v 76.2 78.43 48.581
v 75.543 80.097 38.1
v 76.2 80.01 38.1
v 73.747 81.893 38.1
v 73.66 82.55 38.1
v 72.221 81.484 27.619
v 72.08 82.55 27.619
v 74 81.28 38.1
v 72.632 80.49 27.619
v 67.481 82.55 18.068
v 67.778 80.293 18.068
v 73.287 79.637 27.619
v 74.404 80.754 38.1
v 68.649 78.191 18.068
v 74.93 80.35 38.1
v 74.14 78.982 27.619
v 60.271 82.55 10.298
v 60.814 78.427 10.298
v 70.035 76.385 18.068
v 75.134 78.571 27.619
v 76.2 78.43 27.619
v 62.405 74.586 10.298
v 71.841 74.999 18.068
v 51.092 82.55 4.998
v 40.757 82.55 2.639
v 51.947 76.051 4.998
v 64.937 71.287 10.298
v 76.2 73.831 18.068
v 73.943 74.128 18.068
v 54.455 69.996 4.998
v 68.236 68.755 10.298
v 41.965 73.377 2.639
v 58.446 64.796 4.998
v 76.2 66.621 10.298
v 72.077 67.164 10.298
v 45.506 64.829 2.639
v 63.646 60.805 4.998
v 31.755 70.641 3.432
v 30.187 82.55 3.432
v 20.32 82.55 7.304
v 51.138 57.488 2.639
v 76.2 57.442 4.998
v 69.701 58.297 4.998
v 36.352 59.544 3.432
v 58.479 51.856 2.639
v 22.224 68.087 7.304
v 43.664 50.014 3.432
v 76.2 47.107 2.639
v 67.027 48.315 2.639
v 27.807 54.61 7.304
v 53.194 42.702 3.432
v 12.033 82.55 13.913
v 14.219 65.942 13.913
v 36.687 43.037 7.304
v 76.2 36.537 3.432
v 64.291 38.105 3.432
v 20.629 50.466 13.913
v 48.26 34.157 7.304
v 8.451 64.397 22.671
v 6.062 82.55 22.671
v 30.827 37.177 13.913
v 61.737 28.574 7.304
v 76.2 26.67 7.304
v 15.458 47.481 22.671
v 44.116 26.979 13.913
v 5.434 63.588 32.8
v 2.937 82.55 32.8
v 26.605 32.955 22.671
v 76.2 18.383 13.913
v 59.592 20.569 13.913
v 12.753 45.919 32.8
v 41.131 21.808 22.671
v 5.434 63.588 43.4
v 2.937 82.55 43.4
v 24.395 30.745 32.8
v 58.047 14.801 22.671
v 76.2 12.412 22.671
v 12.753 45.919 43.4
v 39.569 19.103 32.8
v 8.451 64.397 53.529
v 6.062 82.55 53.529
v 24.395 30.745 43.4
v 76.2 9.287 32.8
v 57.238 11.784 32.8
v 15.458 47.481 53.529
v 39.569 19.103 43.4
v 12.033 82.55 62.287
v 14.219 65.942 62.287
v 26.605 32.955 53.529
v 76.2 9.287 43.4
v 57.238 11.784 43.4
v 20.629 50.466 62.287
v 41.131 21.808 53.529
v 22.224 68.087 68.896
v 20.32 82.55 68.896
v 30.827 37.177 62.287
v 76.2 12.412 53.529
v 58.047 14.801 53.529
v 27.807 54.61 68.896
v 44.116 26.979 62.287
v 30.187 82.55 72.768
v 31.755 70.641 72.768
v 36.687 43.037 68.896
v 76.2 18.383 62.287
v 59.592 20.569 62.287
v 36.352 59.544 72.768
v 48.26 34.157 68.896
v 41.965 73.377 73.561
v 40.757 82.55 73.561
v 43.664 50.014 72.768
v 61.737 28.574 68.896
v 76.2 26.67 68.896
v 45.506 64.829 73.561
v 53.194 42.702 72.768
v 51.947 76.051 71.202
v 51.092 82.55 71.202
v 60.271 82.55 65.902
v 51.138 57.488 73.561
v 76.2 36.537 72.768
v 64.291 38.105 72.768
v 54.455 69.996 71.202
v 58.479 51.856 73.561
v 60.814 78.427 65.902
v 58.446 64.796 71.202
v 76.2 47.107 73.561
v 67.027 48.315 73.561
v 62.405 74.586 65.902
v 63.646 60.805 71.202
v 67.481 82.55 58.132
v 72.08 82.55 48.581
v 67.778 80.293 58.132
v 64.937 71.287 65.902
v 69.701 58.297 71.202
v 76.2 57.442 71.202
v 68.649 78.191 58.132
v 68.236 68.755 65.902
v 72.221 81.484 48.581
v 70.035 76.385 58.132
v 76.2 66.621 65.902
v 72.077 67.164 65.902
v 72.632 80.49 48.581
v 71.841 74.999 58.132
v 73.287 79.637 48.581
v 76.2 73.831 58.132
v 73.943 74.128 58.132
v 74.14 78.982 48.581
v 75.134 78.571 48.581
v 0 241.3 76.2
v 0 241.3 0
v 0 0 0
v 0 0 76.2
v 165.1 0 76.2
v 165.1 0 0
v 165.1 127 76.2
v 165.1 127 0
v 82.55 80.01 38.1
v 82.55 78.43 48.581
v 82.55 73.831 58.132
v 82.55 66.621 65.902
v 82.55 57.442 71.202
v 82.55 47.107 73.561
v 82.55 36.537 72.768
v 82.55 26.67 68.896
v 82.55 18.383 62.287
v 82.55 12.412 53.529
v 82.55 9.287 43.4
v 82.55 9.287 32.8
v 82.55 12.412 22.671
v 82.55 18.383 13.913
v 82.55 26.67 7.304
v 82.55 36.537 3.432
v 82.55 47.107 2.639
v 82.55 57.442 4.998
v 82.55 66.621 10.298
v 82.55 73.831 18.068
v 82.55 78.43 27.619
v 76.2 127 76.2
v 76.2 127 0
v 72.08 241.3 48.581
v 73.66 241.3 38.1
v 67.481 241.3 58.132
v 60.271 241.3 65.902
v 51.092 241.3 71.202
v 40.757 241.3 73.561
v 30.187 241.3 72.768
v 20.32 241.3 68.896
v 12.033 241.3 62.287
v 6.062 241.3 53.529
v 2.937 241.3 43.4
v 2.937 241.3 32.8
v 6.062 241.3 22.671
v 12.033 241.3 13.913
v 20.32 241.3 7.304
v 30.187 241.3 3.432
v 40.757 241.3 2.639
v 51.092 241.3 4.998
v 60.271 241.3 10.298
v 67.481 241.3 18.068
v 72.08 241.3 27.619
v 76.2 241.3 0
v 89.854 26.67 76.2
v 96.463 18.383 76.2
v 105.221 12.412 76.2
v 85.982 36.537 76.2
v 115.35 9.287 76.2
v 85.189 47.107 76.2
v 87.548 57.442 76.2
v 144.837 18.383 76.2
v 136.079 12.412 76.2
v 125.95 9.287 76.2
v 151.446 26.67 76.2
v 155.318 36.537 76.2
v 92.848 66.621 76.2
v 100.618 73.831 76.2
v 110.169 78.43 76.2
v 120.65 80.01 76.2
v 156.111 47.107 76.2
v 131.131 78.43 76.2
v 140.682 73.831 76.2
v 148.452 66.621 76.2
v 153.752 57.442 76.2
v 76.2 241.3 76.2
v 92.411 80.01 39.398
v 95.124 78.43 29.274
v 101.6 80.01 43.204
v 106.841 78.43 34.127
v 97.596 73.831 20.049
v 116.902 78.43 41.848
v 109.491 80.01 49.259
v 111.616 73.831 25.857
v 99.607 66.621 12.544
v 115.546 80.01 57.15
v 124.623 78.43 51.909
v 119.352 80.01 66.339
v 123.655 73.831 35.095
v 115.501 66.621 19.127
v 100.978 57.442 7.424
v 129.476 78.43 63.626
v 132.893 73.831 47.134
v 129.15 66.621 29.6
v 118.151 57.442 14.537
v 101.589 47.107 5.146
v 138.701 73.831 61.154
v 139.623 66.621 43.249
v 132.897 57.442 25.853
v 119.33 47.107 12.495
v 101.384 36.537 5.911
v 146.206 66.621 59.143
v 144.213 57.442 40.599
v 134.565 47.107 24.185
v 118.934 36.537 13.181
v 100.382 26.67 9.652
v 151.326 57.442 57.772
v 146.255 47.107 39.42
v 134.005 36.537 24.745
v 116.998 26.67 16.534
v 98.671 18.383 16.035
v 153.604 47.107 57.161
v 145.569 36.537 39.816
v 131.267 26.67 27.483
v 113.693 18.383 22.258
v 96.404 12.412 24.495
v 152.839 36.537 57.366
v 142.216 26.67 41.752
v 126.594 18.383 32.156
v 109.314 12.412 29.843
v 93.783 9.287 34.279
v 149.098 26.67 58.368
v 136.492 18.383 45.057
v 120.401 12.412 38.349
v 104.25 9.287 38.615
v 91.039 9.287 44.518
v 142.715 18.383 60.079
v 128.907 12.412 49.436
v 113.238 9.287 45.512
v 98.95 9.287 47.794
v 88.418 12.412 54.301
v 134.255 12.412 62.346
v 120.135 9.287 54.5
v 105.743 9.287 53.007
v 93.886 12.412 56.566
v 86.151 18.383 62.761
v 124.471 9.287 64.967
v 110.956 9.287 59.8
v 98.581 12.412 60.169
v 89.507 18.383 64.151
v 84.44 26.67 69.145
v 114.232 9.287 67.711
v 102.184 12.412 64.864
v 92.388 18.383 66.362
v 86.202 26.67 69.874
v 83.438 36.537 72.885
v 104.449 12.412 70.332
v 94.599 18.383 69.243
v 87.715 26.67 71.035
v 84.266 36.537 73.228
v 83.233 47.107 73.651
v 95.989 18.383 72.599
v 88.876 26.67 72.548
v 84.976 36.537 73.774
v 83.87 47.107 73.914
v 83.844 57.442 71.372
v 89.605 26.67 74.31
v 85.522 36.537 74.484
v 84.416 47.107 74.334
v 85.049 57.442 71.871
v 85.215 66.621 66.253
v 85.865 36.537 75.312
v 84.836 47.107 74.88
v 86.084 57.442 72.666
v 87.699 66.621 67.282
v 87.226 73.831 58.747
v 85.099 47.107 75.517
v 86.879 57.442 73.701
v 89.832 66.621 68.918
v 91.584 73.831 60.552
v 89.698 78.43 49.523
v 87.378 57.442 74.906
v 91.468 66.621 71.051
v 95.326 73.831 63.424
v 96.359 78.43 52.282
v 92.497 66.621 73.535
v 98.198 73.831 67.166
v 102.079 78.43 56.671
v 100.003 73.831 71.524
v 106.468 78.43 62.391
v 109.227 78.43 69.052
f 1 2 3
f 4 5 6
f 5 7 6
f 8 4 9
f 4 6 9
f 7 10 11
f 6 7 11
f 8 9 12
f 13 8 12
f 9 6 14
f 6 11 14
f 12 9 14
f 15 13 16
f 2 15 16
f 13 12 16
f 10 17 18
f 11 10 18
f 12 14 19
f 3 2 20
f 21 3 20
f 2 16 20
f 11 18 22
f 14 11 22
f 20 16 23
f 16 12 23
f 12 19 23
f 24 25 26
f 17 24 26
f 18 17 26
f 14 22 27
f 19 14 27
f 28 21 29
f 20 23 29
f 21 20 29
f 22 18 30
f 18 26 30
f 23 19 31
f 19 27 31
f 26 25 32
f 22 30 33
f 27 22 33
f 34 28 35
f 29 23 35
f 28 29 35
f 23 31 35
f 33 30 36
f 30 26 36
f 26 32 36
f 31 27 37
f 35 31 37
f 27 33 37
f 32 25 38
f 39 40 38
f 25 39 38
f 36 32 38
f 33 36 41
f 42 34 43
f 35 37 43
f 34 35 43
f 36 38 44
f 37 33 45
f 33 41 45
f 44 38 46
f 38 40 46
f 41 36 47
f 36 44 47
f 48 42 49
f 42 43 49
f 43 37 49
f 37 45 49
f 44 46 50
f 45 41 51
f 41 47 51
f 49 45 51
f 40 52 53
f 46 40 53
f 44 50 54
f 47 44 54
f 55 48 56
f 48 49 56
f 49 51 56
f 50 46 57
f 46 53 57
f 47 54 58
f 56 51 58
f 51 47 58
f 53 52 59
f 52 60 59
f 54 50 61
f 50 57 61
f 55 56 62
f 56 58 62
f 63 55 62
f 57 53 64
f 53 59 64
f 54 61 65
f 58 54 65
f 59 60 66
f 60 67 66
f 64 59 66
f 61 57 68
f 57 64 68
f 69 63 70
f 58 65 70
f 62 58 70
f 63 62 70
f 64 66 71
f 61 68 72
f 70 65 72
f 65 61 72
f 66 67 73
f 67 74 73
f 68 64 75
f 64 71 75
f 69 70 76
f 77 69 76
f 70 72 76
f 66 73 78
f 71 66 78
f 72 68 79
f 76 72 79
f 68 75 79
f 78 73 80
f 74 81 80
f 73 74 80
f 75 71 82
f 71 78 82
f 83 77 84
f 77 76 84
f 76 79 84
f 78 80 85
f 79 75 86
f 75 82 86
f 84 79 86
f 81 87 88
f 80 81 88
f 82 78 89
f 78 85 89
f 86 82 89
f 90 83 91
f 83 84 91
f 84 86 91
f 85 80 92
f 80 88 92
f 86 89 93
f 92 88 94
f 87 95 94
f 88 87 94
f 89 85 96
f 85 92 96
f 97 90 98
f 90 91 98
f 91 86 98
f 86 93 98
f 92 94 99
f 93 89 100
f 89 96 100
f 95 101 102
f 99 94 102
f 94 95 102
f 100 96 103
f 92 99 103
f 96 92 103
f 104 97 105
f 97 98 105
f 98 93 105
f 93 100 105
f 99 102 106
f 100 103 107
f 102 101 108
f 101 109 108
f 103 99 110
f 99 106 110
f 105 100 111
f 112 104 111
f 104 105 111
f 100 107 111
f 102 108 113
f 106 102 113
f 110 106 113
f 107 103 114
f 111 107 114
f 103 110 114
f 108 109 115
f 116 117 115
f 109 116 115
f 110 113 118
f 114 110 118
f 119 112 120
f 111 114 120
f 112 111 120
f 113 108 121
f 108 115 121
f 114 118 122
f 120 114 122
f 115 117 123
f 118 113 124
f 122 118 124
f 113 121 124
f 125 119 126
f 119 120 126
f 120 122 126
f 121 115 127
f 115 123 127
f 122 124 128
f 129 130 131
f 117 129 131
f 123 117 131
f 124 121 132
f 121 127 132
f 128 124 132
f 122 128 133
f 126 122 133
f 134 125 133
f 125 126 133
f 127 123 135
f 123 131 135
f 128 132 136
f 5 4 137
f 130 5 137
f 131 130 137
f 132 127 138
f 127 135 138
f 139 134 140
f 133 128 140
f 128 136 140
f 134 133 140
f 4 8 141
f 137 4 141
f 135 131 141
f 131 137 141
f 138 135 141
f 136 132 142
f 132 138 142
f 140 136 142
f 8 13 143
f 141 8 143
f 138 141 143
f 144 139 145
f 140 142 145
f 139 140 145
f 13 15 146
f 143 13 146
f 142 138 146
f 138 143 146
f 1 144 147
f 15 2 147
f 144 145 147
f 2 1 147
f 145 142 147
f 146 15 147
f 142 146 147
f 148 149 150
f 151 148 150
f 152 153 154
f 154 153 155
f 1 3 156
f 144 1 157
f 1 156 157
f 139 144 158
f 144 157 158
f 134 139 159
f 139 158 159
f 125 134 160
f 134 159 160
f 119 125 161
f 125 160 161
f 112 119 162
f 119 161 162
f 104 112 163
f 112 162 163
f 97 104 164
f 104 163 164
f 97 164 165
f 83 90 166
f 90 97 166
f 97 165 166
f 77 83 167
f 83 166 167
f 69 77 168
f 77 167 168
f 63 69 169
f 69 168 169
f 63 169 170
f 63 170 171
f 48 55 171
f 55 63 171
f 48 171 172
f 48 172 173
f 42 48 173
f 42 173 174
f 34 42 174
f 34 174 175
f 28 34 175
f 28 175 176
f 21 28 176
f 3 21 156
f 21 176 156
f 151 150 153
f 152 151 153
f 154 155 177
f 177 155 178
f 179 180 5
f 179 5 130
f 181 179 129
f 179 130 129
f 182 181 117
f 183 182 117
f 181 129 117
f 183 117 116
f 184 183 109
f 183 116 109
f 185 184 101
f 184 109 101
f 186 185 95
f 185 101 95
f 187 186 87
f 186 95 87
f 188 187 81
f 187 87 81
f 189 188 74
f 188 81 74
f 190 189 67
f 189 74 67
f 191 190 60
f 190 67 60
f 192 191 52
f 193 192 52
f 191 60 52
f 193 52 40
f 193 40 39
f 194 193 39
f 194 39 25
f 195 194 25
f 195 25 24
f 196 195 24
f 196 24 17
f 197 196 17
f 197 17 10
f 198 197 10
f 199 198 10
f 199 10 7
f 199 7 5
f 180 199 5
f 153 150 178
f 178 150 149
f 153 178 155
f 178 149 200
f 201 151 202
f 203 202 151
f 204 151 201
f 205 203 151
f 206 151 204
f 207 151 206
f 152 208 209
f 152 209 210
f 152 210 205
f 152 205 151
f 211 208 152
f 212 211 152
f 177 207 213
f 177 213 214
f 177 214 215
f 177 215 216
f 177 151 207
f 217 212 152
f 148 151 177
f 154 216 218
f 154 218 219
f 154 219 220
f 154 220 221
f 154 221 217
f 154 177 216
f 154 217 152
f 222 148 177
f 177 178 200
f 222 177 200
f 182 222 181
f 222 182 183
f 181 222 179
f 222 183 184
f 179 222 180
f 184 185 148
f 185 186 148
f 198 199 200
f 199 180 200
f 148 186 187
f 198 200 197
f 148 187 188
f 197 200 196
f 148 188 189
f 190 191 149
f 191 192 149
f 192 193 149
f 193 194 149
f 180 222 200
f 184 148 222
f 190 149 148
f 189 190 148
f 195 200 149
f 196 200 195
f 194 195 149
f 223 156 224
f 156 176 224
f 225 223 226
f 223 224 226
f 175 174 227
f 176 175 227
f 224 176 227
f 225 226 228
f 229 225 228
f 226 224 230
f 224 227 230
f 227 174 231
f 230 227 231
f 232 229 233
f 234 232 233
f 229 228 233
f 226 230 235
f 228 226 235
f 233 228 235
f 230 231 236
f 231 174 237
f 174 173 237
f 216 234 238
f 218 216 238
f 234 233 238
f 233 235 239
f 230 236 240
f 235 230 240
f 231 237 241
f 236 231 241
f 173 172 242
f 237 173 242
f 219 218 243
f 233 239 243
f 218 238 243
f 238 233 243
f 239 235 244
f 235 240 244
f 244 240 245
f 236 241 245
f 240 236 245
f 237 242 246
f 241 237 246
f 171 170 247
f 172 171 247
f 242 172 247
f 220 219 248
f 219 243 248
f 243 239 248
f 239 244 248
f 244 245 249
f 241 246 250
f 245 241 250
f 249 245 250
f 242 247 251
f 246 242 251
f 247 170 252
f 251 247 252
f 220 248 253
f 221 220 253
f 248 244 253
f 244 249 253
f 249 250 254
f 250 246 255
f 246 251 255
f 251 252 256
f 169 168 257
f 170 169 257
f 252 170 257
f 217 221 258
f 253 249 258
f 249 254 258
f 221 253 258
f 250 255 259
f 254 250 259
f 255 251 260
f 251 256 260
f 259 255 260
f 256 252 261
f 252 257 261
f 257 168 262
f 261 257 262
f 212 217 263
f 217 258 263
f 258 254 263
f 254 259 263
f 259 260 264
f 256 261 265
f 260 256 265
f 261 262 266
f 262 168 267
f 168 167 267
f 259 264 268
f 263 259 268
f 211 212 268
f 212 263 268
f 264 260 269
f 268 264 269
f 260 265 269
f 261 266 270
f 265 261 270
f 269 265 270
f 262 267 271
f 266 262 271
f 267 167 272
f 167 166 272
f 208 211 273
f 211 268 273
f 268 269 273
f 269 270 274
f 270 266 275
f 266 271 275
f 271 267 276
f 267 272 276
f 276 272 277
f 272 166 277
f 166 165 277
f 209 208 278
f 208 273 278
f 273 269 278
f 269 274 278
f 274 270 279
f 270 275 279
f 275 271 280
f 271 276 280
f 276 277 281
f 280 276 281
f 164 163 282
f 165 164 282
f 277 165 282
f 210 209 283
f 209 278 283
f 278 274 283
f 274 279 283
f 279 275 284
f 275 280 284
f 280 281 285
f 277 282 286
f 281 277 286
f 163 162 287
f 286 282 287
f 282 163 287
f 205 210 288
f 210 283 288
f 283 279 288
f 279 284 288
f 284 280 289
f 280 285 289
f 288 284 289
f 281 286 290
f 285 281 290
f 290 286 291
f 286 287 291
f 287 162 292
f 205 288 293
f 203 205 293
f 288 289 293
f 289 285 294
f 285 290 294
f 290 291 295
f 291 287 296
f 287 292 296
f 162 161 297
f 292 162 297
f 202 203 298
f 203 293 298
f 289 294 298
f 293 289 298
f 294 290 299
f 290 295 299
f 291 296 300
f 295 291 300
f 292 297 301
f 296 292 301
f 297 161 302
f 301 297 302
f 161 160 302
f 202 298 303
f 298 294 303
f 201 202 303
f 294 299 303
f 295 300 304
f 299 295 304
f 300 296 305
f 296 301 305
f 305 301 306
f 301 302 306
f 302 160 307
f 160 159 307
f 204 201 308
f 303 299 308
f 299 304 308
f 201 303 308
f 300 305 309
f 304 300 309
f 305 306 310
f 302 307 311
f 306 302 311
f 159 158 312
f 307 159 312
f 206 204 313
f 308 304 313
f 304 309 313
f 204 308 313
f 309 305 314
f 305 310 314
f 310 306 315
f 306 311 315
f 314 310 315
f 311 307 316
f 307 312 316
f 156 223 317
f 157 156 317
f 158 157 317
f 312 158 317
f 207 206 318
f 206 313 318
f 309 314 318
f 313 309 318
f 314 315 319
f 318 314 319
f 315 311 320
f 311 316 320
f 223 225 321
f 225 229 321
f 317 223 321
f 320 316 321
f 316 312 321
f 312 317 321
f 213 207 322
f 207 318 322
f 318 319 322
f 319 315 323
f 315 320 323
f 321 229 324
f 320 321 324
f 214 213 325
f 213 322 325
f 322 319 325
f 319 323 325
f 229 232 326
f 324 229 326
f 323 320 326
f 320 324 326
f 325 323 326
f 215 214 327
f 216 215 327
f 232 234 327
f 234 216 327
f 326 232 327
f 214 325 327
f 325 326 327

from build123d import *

# Parameters (mm, degrees)
BOSS_EXTRUDE1_DEPTH = 76.2
SKETCH2_R           = 35.56


with BuildPart() as part:
    # Sketch1 → Boss-Extrude1 (new body)
    with BuildSketch(Plane.XY):
        Polygon((0, 241.3), (0, 0), (165.1, 0), (165.1, 127), (76.2, 127), (76.2, 241.3), align=None)
    extrude(amount=BOSS_EXTRUDE1_DEPTH)

    # Cut-Sweep1: sweep along a curve in space
    with BuildLine() as cut_sweep1_path:
        Line((38.1, 241.3, 38.1), (38.1, 82.55, 38.1))
        ThreePointArc((38.1, 82.55, 38.1), (49.259231637, 55.609231637, 38.1), (76.2, 44.45, 38.1))
        Line((76.2, 44.45, 38.1), (82.55, 44.45, 38.1))
        ThreePointArc((120.65, 44.45, 76.2), (109.490768363, 44.45, 49.259231637), (82.55, 44.45, 38.1))
    # Sketch2 → Cut-Sweep1 (sweep, cut)
    with BuildSketch(Plane(origin=(0, 241.3, 0), x_dir=(1, 0, 0), z_dir=(0, 1, 0))):
        with Locations((38.1, -38.1)):
            Circle(SKETCH2_R)
    sweep(path=cut_sweep1_path.line, mode=Mode.SUBTRACT)


solid = part.part
